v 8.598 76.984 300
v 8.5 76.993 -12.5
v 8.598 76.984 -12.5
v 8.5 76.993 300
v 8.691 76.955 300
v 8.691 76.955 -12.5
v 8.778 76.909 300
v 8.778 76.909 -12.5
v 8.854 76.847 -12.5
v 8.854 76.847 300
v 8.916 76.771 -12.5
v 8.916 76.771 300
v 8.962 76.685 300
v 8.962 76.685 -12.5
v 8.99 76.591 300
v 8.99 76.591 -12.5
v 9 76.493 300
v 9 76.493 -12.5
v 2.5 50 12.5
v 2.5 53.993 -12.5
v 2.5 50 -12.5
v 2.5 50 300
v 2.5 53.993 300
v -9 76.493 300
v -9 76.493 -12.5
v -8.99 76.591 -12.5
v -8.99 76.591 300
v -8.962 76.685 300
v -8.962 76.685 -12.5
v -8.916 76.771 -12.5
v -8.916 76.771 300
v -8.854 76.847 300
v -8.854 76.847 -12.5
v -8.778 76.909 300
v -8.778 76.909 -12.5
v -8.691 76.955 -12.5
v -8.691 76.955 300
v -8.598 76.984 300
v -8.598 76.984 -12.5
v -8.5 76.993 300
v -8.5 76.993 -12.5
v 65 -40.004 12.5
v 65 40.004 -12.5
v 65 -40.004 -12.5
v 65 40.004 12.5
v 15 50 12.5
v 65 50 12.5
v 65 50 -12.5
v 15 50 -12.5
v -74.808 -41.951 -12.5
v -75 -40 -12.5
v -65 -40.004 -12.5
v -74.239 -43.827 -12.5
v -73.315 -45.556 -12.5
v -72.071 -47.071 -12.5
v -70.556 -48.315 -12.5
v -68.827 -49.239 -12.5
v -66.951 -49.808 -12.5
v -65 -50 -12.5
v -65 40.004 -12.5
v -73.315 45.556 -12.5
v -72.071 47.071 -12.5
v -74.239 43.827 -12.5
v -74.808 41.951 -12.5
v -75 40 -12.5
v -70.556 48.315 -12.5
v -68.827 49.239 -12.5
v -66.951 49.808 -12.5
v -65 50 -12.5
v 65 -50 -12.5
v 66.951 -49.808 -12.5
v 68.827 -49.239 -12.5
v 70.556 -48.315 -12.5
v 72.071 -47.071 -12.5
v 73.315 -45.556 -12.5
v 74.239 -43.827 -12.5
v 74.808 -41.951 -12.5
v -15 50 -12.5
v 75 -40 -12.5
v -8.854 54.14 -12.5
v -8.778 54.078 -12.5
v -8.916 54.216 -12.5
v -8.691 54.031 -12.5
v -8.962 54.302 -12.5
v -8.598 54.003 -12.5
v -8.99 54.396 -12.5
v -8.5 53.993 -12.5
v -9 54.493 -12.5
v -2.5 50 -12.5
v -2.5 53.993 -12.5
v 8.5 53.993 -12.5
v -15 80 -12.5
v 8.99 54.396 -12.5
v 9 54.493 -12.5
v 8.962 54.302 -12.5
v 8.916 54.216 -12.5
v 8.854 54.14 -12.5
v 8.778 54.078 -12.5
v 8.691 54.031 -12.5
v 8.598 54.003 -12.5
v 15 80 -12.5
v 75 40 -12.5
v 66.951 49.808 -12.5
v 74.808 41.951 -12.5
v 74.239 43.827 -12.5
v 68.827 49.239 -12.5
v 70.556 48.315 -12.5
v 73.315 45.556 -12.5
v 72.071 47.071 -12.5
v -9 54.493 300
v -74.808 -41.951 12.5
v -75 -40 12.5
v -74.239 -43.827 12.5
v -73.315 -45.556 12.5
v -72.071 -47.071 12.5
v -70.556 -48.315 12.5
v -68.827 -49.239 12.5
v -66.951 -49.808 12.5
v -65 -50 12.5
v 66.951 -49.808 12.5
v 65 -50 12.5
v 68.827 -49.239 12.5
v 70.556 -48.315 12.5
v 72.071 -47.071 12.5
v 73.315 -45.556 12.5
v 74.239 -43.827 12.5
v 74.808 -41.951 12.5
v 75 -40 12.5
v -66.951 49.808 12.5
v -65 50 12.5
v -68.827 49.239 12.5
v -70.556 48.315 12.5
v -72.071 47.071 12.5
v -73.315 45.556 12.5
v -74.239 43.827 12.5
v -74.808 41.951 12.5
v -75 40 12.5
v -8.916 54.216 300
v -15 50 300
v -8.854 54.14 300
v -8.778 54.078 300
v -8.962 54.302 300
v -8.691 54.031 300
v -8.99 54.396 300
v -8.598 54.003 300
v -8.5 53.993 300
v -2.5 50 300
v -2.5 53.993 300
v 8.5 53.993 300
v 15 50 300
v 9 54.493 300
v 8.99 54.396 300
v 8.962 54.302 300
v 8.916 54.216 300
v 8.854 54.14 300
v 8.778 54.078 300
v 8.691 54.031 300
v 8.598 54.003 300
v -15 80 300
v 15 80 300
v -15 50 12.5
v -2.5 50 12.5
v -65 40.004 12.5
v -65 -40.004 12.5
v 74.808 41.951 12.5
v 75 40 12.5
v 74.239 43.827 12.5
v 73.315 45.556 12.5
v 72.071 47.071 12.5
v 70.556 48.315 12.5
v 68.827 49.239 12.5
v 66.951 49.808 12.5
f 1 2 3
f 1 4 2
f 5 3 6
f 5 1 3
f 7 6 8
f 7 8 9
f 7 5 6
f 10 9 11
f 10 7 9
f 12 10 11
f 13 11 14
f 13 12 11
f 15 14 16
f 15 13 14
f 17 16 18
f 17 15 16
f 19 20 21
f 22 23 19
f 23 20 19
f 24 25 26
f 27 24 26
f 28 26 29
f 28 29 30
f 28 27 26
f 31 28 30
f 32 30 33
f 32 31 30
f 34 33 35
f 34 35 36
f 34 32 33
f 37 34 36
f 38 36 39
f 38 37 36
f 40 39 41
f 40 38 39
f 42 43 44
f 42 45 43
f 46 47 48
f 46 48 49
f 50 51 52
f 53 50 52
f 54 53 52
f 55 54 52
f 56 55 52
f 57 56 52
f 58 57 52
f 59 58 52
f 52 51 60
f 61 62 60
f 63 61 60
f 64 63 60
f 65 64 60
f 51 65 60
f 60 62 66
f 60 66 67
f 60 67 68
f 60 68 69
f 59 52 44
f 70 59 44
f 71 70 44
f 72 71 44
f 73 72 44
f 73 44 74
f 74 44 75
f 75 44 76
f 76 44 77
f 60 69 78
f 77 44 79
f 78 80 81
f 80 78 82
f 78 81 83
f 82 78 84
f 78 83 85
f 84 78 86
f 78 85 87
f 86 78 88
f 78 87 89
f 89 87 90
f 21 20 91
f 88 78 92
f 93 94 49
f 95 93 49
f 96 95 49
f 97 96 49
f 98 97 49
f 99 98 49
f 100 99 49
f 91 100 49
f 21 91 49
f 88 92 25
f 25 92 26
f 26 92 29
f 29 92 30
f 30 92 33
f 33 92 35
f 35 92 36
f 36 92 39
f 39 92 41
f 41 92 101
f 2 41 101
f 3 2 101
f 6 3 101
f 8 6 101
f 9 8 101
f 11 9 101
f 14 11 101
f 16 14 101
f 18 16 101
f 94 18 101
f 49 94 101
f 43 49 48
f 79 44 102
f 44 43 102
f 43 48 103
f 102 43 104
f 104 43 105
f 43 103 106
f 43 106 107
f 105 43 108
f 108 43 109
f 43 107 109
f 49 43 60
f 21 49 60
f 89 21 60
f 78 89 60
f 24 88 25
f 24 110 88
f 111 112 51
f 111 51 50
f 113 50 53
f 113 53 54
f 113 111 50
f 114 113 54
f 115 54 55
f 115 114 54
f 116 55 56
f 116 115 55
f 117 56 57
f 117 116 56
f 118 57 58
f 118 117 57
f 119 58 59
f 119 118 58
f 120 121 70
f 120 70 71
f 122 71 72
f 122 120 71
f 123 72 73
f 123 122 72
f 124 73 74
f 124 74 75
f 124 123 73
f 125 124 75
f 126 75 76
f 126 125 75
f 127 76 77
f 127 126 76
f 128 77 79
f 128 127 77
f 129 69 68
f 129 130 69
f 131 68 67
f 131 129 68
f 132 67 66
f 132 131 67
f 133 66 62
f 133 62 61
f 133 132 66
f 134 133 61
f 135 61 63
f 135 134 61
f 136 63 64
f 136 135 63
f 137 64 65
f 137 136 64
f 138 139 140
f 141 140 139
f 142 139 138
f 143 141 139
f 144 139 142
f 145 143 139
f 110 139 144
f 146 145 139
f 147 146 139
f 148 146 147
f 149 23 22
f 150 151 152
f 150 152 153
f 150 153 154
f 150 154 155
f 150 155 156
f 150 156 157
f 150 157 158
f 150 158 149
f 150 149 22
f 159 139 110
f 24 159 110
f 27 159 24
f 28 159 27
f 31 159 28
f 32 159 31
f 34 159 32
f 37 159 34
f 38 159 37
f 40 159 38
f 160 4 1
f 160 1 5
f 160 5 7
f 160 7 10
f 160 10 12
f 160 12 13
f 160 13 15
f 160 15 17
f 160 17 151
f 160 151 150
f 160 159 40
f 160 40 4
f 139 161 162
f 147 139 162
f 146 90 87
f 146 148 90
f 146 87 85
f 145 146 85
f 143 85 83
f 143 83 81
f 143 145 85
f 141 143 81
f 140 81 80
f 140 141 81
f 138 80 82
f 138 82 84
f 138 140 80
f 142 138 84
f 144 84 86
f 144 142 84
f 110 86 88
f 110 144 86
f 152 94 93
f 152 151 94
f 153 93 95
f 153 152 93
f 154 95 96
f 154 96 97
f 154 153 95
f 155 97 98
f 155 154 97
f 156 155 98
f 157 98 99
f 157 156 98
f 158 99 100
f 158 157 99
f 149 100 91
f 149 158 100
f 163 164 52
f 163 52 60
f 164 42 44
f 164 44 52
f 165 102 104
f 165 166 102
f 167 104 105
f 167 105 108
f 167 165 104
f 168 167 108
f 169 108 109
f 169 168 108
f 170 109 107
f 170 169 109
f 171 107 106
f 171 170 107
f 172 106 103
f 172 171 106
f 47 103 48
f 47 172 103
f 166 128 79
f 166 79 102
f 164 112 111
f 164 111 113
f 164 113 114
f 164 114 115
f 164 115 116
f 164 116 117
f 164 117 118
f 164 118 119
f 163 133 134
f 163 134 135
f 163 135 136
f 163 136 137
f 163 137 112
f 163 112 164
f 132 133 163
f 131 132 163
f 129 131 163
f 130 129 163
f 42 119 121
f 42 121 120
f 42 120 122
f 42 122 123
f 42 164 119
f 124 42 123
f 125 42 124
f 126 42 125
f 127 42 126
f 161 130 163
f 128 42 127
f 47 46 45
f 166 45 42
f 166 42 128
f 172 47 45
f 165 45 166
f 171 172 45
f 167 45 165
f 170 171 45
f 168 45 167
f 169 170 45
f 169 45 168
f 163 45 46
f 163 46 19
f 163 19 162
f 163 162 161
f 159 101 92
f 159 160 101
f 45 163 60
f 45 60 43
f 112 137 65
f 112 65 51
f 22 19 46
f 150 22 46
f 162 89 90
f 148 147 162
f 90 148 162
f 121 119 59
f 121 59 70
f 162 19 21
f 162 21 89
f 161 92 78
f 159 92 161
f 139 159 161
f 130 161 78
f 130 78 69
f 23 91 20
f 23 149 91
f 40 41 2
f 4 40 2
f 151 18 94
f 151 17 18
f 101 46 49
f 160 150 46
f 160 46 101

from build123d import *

# Parameters (mm, degrees)
F1_DEPTH      = 12.5
F2_DEPTH      = 300
F2_DEPTH_BACK = 12.5
F0_R          = 6
F3_DEPTH      = 50
F4_R          = 0.5


# Not quite as in the source:
# - a feature names something its author has since deleted; it is built from what else it names


with BuildPart() as f1:
    # F0 (on Top) → F1 (new body, symmetric)
    with BuildSketch(Plane.XY):
        with BuildLine():
            Line((-15, 50), (-65, 50))
            ThreePointArc((-65, 50), (-72.0710678119, 47.0710678119), (-75, 40))
            Line((-75, 40), (-75, -40))
            ThreePointArc((-75, -40), (-72.0710678119, -47.0710678119), (-65, -50))
            Line((-65, -50), (65, -50))
            ThreePointArc((65, -50), (72.0710678119, -47.0710678119), (75, -40))
            Line((75, -40), (75, 40))
            ThreePointArc((75, 40), (72.0710678119, 47.0710678119), (65, 50))
            Line((65, 50), (15, 50))
            Line((15, 50), (2.5, 50))
            Line((2.5, 50), (2.5, 40.0037090484))
            Line((2.5, 40.0037090484), (65, 40.0037090484))
            Line((65, 40.0037090484), (65, -40.0037090484))
            Line((65, -40.0037090484), (-65, -40.0037090484))
            Line((-65, -40.0037090484), (-65, 40.0037090484))
            Line((-65, 40.0037090484), (-2.5, 40.0037090484))
            Line((-2.5, 40.0037090484), (-2.5, 50))
            Line((-2.5, 50), (-15, 50))
        make_face()
        Polygon((2.5, 50), (-2.5, 50), (-2.5, 40.0037090484), (0, 40.0037090484), (2.5, 40.0037090484), align=None)
    extrude(amount=F1_DEPTH, both=True)

    # F0 (on Top) → F2 (join, two sides)
    with BuildSketch(Plane.XY) as f2_sk:
        Polygon((-15, 80), (-15, 50), (-2.5, 50), (-2.5, 53.9933157269), (-9, 53.9933157269), (-9, 76.9933157269), (0, 76.9933157269), (0, 79.2549662558), (0, 80), align=None)
        Polygon((2.5, 53.9933157269), (2.5, 50), (15, 50), (15, 80), (0, 80), (0, 79.2549662558), (0, 76.9933157269), (9, 76.9933157269), (9, 53.9933157269), align=None)
    extrude(amount=F2_DEPTH)
    extrude(f2_sk.sketch, amount=-F2_DEPTH_BACK)

    # F0 (on Top) → F3 (cut)
    with BuildSketch(Plane.XY):
        with Locations((0, 69.7)):
            Circle(F0_R)
    extrude(amount=F3_DEPTH, mode=Mode.SUBTRACT)

    # F4
    f4_edges = [f1.edges().sort_by_distance(p)[0] for p in [
        (-9, 76.993316, 143.75),
        (9, 76.993316, 143.75),
        (-9, 53.993316, 143.75),
        (9, 53.993316, 143.75),
    ]]
    fillet(f4_edges, radius=F4_R)


solid = f1.part
